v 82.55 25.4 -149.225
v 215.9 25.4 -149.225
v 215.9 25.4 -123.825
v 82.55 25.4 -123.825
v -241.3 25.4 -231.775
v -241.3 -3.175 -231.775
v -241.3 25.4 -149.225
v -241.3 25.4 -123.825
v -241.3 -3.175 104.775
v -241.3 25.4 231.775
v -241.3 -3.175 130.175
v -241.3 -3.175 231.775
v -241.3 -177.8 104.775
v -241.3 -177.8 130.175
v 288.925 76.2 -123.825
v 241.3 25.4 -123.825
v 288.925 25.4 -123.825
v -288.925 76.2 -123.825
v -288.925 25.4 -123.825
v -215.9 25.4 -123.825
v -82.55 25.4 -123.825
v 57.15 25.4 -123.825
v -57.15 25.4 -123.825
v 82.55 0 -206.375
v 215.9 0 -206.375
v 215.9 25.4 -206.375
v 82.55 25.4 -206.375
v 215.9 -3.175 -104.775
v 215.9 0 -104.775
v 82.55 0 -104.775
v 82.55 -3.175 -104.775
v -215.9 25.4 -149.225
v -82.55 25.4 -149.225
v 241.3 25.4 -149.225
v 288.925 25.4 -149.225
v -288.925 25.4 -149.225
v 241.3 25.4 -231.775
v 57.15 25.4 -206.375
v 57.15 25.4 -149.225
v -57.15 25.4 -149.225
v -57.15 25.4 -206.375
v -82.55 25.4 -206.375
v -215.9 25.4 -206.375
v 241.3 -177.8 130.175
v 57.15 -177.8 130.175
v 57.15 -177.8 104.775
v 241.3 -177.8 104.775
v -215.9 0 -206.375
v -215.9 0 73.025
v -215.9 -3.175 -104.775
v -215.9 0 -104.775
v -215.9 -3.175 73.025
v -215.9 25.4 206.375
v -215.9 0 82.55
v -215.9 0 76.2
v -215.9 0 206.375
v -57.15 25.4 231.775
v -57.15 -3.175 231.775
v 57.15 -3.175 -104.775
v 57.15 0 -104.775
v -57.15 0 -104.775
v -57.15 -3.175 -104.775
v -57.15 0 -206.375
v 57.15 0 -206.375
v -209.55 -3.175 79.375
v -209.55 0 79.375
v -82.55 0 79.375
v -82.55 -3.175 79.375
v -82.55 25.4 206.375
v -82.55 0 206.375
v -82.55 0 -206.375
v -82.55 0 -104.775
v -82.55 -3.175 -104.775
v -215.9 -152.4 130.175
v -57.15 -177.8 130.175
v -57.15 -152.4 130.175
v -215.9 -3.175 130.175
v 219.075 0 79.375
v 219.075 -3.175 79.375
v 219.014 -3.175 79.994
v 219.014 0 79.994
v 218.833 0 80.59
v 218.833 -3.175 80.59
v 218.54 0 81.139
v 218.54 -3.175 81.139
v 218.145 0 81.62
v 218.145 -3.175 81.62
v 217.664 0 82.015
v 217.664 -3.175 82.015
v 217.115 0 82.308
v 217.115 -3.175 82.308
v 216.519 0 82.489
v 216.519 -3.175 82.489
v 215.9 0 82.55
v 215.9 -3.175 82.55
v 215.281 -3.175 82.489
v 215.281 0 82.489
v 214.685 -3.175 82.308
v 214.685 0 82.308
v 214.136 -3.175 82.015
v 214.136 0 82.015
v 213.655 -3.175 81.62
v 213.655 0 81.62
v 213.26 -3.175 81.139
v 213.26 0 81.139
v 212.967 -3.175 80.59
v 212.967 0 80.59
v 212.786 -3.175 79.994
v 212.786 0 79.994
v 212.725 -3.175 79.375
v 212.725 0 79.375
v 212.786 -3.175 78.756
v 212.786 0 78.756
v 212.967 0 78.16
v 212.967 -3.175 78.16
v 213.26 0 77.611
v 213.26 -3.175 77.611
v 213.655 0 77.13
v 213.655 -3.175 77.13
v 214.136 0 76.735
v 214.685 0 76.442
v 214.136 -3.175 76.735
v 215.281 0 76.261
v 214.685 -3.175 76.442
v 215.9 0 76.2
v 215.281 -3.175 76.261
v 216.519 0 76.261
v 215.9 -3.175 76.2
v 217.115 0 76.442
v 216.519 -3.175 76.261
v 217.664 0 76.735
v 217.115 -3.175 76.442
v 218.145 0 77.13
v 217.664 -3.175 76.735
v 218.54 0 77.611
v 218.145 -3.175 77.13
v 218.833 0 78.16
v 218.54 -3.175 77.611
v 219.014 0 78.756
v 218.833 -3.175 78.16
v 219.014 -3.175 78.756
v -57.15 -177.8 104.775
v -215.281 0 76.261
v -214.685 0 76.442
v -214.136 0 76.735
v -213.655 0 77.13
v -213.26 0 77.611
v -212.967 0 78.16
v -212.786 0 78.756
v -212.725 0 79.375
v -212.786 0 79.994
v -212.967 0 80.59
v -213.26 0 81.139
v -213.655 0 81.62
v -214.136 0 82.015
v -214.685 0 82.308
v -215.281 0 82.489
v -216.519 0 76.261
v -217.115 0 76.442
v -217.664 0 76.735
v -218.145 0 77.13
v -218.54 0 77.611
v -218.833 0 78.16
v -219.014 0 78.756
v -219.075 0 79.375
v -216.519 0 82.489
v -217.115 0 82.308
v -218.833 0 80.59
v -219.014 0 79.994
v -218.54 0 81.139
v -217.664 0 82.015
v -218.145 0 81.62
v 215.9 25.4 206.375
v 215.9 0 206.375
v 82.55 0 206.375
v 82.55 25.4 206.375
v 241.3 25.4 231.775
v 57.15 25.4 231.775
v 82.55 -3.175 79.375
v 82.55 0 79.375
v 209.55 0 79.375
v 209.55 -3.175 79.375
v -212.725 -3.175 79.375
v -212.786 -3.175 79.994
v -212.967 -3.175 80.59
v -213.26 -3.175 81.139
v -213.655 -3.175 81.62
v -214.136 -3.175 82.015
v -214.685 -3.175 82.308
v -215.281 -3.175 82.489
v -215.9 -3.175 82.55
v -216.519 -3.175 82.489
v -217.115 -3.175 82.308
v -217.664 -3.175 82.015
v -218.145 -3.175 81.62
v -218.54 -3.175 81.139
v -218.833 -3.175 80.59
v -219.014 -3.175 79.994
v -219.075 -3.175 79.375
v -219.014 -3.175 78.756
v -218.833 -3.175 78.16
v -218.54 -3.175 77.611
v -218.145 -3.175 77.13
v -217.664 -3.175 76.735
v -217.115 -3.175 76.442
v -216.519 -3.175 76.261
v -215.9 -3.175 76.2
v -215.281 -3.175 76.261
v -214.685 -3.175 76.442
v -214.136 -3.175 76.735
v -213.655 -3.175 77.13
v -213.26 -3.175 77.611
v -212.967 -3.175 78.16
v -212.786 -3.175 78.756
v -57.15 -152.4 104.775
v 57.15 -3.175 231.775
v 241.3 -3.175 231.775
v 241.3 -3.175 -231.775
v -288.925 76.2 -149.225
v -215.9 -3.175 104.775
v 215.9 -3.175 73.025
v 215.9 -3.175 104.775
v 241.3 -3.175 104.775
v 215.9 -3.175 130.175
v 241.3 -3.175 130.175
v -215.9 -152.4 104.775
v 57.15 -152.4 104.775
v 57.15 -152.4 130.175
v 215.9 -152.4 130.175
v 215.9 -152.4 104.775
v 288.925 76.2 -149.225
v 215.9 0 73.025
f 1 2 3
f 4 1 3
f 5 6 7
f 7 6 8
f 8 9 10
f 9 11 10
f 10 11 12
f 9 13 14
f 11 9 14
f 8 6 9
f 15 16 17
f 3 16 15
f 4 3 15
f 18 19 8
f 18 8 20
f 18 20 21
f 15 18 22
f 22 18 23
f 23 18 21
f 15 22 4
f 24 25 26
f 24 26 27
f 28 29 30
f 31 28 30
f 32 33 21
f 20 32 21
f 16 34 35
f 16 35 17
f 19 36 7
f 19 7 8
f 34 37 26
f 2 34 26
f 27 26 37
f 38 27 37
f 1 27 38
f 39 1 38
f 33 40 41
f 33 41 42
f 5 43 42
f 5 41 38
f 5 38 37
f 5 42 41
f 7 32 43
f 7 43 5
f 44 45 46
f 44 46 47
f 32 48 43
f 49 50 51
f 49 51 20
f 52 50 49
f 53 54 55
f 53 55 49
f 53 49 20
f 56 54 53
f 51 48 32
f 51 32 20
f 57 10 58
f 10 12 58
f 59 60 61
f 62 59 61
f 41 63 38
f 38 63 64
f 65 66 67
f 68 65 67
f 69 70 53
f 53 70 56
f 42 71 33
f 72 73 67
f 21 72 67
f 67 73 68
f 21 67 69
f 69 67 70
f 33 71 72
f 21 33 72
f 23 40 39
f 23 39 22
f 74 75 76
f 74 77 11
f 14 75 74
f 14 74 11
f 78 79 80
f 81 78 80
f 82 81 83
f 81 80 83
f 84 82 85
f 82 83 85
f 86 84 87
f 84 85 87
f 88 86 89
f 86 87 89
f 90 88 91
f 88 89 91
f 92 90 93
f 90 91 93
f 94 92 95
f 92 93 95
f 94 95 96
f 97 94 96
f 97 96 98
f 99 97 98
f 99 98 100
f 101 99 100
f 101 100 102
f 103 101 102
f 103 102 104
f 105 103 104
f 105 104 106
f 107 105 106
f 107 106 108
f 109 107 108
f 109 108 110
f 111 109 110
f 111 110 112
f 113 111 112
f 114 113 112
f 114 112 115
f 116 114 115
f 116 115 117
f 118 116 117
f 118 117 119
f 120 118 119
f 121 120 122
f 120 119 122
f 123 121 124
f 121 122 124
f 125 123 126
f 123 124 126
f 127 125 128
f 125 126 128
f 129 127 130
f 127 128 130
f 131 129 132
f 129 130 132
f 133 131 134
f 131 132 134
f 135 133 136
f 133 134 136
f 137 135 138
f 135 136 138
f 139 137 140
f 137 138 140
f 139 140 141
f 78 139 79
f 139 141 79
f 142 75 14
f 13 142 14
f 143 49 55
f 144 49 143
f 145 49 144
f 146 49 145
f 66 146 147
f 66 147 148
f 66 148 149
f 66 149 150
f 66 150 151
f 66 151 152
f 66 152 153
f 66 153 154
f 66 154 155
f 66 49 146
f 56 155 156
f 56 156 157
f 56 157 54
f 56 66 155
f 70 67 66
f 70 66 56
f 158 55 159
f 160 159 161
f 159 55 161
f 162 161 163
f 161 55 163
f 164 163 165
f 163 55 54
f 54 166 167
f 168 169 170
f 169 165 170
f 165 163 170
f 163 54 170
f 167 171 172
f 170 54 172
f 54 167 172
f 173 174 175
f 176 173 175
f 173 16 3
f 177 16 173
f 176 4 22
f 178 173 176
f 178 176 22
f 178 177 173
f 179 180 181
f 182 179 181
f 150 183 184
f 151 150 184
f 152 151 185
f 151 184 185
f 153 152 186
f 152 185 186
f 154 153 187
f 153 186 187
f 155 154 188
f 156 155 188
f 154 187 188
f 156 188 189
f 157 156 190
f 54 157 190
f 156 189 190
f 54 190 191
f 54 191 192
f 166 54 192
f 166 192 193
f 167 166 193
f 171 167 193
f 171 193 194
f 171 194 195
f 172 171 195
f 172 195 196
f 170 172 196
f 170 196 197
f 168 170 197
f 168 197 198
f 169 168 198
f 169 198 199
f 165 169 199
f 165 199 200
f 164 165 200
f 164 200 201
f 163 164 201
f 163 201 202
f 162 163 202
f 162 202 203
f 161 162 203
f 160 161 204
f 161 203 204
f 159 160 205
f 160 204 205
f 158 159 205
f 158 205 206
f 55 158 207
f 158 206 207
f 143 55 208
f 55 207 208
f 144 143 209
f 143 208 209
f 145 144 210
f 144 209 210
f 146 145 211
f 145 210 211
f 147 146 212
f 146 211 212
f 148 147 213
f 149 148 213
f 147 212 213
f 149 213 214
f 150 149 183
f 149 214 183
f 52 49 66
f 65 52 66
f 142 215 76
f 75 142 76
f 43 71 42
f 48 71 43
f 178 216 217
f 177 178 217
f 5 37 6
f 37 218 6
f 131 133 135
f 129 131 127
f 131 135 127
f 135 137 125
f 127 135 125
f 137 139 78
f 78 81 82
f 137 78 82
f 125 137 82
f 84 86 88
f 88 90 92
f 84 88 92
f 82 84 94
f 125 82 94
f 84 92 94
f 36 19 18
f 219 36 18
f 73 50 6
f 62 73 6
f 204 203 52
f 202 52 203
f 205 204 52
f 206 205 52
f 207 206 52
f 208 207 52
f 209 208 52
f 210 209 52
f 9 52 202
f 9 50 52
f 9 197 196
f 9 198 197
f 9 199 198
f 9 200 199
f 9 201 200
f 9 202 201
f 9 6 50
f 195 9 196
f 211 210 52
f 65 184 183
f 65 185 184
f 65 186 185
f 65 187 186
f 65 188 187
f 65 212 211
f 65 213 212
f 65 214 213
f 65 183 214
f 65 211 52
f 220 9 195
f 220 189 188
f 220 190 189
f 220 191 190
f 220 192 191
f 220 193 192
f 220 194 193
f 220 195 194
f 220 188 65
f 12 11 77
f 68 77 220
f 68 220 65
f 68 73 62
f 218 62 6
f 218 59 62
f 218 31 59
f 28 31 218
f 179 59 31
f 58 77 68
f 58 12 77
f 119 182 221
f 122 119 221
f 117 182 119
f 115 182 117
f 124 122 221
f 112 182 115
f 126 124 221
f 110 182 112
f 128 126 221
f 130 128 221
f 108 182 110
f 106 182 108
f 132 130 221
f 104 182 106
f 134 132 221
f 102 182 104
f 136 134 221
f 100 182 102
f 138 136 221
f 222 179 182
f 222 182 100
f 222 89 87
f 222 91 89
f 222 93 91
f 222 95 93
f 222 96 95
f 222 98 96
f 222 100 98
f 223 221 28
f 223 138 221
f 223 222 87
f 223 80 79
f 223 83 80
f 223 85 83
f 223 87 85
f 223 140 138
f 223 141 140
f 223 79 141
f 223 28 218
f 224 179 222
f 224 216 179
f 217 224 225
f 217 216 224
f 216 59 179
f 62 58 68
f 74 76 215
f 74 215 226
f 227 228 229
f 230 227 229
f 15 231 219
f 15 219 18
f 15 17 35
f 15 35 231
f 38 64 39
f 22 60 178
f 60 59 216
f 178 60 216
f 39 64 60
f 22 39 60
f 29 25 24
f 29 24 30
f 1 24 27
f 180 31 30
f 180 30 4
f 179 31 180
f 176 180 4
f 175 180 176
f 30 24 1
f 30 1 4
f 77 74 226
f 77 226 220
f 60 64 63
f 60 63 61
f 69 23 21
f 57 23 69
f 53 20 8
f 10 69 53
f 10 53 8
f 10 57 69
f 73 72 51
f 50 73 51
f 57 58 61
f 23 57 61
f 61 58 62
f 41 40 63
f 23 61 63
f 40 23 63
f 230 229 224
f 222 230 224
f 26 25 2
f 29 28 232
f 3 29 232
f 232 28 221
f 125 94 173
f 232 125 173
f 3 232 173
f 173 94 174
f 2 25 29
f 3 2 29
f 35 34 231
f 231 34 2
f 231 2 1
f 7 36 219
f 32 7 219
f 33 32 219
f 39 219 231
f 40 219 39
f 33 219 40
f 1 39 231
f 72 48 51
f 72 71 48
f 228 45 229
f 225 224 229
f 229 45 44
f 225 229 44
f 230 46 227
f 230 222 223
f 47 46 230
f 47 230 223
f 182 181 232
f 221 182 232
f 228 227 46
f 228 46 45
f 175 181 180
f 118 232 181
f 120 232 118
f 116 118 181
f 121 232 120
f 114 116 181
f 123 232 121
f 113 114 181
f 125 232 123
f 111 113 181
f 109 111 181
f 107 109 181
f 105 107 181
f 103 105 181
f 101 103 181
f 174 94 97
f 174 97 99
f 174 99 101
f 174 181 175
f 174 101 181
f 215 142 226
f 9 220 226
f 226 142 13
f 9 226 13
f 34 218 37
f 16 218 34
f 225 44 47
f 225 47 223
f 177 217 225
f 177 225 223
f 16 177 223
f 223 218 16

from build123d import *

# Parameters (mm, degrees)
F1_DEPTH  = 3.175
F2_W      = 177.8
F2_H      = 25.4
F3_DEPTH  = 25.4
F4_W      = 184.15
F4_H      = 25.4
F5_DEPTH  = 25.4
F7_R      = 3.175
F8_DEPTH  = 25.4
F9_W      = 133.35
F9_H      = 412.75
F10_DEPTH = 25.4
F11_W     = 50.8
F11_H     = 25.4
F12_DEPTH = 530.225
F13_W     = 50.8
F13_H     = 25.4
F14_DEPTH = 47.625


with BuildPart() as f1:
    # F0 (on Front) → F1 (new body)
    with BuildSketch(Plane.XZ):
        Polygon((241.3, -231.775), (241.3, 231.775), (57.15, 231.775), (57.15, -104.775), (-57.15, -104.775), (-57.15, 231.775), (-241.3, 231.775), (-241.3, 79.375), (-241.3, -104.775), (-241.3, -231.775), align=None)
        Polygon((-215.9, 73.025), (-209.55, 79.375), (-82.55, 79.375), (-82.55, -104.775), (-215.9, -104.775), align=None, mode=Mode.SUBTRACT)
        Polygon((82.55, -104.775), (82.55, 79.375), (209.55, 79.375), (215.9, 73.025), (215.9, -104.775), align=None, mode=Mode.SUBTRACT)
    extrude(amount=F1_DEPTH)

    # F2 (on face) → F3 (join)
    with BuildSketch(Plane.YZ.offset(241.3)):
        with Locations((-88.9, 117.475)):
            Rectangle(F2_W, F2_H)
    extrude(amount=-F3_DEPTH)

    # F4 (on face) → F5 (join)
    with BuildSketch(Plane.XZ.offset(177.8)):
        with Locations((149.225, 117.475)):
            Rectangle(F4_W, F4_H)
    extrude(amount=-F5_DEPTH)

    # F6: F1 across plane


with BuildPart() as f1_1:
    add(f1.part)
    add(f1.part.mirror(Plane.YZ))

    # F7 (on face) → F8 (cut)
    with BuildSketch(Plane.XZ.offset(3.175)):
        with Locations((-215.9, 79.375)):
            Circle(F7_R)
        with Locations((215.9, 79.375)):
            Circle(F7_R)
    extrude(amount=-F8_DEPTH, mode=Mode.SUBTRACT)

    # F9 (on face) → F10 (join)
    with BuildSketch(Plane(origin=(0, 0, 0), x_dir=(-1, 0, 0), z_dir=(0, 1, 0))):
        Polygon((-57.15, 231.775), (-241.3, 231.775), (-241.3, -206.375), (-241.3, -231.775), (241.3, -231.775), (241.3, 231.775), (57.15, 231.775), (57.15, -206.375), (-57.15, -206.375), align=None)
        with Locations((-149.225, 0)):
            Rectangle(F9_W, F9_H, mode=Mode.SUBTRACT)
        with Locations((149.225, 0)):
            Rectangle(F9_W, F9_H, mode=Mode.SUBTRACT)
    extrude(amount=F10_DEPTH)

    # F11 (on face) → F12 (join)
    with BuildSketch(Plane.YZ.offset(241.3)):
        with Locations((50.8, -136.525)):
            Rectangle(F11_W, F11_H)
    extrude(amount=-F12_DEPTH)

    # F13 (on face) → F14 (join)
    with BuildSketch(Plane.YZ.offset(241.3)):
        with Locations((50.8, -136.525)):
            Rectangle(F13_W, F13_H)
    extrude(amount=F14_DEPTH)


solid = f1_1.part
